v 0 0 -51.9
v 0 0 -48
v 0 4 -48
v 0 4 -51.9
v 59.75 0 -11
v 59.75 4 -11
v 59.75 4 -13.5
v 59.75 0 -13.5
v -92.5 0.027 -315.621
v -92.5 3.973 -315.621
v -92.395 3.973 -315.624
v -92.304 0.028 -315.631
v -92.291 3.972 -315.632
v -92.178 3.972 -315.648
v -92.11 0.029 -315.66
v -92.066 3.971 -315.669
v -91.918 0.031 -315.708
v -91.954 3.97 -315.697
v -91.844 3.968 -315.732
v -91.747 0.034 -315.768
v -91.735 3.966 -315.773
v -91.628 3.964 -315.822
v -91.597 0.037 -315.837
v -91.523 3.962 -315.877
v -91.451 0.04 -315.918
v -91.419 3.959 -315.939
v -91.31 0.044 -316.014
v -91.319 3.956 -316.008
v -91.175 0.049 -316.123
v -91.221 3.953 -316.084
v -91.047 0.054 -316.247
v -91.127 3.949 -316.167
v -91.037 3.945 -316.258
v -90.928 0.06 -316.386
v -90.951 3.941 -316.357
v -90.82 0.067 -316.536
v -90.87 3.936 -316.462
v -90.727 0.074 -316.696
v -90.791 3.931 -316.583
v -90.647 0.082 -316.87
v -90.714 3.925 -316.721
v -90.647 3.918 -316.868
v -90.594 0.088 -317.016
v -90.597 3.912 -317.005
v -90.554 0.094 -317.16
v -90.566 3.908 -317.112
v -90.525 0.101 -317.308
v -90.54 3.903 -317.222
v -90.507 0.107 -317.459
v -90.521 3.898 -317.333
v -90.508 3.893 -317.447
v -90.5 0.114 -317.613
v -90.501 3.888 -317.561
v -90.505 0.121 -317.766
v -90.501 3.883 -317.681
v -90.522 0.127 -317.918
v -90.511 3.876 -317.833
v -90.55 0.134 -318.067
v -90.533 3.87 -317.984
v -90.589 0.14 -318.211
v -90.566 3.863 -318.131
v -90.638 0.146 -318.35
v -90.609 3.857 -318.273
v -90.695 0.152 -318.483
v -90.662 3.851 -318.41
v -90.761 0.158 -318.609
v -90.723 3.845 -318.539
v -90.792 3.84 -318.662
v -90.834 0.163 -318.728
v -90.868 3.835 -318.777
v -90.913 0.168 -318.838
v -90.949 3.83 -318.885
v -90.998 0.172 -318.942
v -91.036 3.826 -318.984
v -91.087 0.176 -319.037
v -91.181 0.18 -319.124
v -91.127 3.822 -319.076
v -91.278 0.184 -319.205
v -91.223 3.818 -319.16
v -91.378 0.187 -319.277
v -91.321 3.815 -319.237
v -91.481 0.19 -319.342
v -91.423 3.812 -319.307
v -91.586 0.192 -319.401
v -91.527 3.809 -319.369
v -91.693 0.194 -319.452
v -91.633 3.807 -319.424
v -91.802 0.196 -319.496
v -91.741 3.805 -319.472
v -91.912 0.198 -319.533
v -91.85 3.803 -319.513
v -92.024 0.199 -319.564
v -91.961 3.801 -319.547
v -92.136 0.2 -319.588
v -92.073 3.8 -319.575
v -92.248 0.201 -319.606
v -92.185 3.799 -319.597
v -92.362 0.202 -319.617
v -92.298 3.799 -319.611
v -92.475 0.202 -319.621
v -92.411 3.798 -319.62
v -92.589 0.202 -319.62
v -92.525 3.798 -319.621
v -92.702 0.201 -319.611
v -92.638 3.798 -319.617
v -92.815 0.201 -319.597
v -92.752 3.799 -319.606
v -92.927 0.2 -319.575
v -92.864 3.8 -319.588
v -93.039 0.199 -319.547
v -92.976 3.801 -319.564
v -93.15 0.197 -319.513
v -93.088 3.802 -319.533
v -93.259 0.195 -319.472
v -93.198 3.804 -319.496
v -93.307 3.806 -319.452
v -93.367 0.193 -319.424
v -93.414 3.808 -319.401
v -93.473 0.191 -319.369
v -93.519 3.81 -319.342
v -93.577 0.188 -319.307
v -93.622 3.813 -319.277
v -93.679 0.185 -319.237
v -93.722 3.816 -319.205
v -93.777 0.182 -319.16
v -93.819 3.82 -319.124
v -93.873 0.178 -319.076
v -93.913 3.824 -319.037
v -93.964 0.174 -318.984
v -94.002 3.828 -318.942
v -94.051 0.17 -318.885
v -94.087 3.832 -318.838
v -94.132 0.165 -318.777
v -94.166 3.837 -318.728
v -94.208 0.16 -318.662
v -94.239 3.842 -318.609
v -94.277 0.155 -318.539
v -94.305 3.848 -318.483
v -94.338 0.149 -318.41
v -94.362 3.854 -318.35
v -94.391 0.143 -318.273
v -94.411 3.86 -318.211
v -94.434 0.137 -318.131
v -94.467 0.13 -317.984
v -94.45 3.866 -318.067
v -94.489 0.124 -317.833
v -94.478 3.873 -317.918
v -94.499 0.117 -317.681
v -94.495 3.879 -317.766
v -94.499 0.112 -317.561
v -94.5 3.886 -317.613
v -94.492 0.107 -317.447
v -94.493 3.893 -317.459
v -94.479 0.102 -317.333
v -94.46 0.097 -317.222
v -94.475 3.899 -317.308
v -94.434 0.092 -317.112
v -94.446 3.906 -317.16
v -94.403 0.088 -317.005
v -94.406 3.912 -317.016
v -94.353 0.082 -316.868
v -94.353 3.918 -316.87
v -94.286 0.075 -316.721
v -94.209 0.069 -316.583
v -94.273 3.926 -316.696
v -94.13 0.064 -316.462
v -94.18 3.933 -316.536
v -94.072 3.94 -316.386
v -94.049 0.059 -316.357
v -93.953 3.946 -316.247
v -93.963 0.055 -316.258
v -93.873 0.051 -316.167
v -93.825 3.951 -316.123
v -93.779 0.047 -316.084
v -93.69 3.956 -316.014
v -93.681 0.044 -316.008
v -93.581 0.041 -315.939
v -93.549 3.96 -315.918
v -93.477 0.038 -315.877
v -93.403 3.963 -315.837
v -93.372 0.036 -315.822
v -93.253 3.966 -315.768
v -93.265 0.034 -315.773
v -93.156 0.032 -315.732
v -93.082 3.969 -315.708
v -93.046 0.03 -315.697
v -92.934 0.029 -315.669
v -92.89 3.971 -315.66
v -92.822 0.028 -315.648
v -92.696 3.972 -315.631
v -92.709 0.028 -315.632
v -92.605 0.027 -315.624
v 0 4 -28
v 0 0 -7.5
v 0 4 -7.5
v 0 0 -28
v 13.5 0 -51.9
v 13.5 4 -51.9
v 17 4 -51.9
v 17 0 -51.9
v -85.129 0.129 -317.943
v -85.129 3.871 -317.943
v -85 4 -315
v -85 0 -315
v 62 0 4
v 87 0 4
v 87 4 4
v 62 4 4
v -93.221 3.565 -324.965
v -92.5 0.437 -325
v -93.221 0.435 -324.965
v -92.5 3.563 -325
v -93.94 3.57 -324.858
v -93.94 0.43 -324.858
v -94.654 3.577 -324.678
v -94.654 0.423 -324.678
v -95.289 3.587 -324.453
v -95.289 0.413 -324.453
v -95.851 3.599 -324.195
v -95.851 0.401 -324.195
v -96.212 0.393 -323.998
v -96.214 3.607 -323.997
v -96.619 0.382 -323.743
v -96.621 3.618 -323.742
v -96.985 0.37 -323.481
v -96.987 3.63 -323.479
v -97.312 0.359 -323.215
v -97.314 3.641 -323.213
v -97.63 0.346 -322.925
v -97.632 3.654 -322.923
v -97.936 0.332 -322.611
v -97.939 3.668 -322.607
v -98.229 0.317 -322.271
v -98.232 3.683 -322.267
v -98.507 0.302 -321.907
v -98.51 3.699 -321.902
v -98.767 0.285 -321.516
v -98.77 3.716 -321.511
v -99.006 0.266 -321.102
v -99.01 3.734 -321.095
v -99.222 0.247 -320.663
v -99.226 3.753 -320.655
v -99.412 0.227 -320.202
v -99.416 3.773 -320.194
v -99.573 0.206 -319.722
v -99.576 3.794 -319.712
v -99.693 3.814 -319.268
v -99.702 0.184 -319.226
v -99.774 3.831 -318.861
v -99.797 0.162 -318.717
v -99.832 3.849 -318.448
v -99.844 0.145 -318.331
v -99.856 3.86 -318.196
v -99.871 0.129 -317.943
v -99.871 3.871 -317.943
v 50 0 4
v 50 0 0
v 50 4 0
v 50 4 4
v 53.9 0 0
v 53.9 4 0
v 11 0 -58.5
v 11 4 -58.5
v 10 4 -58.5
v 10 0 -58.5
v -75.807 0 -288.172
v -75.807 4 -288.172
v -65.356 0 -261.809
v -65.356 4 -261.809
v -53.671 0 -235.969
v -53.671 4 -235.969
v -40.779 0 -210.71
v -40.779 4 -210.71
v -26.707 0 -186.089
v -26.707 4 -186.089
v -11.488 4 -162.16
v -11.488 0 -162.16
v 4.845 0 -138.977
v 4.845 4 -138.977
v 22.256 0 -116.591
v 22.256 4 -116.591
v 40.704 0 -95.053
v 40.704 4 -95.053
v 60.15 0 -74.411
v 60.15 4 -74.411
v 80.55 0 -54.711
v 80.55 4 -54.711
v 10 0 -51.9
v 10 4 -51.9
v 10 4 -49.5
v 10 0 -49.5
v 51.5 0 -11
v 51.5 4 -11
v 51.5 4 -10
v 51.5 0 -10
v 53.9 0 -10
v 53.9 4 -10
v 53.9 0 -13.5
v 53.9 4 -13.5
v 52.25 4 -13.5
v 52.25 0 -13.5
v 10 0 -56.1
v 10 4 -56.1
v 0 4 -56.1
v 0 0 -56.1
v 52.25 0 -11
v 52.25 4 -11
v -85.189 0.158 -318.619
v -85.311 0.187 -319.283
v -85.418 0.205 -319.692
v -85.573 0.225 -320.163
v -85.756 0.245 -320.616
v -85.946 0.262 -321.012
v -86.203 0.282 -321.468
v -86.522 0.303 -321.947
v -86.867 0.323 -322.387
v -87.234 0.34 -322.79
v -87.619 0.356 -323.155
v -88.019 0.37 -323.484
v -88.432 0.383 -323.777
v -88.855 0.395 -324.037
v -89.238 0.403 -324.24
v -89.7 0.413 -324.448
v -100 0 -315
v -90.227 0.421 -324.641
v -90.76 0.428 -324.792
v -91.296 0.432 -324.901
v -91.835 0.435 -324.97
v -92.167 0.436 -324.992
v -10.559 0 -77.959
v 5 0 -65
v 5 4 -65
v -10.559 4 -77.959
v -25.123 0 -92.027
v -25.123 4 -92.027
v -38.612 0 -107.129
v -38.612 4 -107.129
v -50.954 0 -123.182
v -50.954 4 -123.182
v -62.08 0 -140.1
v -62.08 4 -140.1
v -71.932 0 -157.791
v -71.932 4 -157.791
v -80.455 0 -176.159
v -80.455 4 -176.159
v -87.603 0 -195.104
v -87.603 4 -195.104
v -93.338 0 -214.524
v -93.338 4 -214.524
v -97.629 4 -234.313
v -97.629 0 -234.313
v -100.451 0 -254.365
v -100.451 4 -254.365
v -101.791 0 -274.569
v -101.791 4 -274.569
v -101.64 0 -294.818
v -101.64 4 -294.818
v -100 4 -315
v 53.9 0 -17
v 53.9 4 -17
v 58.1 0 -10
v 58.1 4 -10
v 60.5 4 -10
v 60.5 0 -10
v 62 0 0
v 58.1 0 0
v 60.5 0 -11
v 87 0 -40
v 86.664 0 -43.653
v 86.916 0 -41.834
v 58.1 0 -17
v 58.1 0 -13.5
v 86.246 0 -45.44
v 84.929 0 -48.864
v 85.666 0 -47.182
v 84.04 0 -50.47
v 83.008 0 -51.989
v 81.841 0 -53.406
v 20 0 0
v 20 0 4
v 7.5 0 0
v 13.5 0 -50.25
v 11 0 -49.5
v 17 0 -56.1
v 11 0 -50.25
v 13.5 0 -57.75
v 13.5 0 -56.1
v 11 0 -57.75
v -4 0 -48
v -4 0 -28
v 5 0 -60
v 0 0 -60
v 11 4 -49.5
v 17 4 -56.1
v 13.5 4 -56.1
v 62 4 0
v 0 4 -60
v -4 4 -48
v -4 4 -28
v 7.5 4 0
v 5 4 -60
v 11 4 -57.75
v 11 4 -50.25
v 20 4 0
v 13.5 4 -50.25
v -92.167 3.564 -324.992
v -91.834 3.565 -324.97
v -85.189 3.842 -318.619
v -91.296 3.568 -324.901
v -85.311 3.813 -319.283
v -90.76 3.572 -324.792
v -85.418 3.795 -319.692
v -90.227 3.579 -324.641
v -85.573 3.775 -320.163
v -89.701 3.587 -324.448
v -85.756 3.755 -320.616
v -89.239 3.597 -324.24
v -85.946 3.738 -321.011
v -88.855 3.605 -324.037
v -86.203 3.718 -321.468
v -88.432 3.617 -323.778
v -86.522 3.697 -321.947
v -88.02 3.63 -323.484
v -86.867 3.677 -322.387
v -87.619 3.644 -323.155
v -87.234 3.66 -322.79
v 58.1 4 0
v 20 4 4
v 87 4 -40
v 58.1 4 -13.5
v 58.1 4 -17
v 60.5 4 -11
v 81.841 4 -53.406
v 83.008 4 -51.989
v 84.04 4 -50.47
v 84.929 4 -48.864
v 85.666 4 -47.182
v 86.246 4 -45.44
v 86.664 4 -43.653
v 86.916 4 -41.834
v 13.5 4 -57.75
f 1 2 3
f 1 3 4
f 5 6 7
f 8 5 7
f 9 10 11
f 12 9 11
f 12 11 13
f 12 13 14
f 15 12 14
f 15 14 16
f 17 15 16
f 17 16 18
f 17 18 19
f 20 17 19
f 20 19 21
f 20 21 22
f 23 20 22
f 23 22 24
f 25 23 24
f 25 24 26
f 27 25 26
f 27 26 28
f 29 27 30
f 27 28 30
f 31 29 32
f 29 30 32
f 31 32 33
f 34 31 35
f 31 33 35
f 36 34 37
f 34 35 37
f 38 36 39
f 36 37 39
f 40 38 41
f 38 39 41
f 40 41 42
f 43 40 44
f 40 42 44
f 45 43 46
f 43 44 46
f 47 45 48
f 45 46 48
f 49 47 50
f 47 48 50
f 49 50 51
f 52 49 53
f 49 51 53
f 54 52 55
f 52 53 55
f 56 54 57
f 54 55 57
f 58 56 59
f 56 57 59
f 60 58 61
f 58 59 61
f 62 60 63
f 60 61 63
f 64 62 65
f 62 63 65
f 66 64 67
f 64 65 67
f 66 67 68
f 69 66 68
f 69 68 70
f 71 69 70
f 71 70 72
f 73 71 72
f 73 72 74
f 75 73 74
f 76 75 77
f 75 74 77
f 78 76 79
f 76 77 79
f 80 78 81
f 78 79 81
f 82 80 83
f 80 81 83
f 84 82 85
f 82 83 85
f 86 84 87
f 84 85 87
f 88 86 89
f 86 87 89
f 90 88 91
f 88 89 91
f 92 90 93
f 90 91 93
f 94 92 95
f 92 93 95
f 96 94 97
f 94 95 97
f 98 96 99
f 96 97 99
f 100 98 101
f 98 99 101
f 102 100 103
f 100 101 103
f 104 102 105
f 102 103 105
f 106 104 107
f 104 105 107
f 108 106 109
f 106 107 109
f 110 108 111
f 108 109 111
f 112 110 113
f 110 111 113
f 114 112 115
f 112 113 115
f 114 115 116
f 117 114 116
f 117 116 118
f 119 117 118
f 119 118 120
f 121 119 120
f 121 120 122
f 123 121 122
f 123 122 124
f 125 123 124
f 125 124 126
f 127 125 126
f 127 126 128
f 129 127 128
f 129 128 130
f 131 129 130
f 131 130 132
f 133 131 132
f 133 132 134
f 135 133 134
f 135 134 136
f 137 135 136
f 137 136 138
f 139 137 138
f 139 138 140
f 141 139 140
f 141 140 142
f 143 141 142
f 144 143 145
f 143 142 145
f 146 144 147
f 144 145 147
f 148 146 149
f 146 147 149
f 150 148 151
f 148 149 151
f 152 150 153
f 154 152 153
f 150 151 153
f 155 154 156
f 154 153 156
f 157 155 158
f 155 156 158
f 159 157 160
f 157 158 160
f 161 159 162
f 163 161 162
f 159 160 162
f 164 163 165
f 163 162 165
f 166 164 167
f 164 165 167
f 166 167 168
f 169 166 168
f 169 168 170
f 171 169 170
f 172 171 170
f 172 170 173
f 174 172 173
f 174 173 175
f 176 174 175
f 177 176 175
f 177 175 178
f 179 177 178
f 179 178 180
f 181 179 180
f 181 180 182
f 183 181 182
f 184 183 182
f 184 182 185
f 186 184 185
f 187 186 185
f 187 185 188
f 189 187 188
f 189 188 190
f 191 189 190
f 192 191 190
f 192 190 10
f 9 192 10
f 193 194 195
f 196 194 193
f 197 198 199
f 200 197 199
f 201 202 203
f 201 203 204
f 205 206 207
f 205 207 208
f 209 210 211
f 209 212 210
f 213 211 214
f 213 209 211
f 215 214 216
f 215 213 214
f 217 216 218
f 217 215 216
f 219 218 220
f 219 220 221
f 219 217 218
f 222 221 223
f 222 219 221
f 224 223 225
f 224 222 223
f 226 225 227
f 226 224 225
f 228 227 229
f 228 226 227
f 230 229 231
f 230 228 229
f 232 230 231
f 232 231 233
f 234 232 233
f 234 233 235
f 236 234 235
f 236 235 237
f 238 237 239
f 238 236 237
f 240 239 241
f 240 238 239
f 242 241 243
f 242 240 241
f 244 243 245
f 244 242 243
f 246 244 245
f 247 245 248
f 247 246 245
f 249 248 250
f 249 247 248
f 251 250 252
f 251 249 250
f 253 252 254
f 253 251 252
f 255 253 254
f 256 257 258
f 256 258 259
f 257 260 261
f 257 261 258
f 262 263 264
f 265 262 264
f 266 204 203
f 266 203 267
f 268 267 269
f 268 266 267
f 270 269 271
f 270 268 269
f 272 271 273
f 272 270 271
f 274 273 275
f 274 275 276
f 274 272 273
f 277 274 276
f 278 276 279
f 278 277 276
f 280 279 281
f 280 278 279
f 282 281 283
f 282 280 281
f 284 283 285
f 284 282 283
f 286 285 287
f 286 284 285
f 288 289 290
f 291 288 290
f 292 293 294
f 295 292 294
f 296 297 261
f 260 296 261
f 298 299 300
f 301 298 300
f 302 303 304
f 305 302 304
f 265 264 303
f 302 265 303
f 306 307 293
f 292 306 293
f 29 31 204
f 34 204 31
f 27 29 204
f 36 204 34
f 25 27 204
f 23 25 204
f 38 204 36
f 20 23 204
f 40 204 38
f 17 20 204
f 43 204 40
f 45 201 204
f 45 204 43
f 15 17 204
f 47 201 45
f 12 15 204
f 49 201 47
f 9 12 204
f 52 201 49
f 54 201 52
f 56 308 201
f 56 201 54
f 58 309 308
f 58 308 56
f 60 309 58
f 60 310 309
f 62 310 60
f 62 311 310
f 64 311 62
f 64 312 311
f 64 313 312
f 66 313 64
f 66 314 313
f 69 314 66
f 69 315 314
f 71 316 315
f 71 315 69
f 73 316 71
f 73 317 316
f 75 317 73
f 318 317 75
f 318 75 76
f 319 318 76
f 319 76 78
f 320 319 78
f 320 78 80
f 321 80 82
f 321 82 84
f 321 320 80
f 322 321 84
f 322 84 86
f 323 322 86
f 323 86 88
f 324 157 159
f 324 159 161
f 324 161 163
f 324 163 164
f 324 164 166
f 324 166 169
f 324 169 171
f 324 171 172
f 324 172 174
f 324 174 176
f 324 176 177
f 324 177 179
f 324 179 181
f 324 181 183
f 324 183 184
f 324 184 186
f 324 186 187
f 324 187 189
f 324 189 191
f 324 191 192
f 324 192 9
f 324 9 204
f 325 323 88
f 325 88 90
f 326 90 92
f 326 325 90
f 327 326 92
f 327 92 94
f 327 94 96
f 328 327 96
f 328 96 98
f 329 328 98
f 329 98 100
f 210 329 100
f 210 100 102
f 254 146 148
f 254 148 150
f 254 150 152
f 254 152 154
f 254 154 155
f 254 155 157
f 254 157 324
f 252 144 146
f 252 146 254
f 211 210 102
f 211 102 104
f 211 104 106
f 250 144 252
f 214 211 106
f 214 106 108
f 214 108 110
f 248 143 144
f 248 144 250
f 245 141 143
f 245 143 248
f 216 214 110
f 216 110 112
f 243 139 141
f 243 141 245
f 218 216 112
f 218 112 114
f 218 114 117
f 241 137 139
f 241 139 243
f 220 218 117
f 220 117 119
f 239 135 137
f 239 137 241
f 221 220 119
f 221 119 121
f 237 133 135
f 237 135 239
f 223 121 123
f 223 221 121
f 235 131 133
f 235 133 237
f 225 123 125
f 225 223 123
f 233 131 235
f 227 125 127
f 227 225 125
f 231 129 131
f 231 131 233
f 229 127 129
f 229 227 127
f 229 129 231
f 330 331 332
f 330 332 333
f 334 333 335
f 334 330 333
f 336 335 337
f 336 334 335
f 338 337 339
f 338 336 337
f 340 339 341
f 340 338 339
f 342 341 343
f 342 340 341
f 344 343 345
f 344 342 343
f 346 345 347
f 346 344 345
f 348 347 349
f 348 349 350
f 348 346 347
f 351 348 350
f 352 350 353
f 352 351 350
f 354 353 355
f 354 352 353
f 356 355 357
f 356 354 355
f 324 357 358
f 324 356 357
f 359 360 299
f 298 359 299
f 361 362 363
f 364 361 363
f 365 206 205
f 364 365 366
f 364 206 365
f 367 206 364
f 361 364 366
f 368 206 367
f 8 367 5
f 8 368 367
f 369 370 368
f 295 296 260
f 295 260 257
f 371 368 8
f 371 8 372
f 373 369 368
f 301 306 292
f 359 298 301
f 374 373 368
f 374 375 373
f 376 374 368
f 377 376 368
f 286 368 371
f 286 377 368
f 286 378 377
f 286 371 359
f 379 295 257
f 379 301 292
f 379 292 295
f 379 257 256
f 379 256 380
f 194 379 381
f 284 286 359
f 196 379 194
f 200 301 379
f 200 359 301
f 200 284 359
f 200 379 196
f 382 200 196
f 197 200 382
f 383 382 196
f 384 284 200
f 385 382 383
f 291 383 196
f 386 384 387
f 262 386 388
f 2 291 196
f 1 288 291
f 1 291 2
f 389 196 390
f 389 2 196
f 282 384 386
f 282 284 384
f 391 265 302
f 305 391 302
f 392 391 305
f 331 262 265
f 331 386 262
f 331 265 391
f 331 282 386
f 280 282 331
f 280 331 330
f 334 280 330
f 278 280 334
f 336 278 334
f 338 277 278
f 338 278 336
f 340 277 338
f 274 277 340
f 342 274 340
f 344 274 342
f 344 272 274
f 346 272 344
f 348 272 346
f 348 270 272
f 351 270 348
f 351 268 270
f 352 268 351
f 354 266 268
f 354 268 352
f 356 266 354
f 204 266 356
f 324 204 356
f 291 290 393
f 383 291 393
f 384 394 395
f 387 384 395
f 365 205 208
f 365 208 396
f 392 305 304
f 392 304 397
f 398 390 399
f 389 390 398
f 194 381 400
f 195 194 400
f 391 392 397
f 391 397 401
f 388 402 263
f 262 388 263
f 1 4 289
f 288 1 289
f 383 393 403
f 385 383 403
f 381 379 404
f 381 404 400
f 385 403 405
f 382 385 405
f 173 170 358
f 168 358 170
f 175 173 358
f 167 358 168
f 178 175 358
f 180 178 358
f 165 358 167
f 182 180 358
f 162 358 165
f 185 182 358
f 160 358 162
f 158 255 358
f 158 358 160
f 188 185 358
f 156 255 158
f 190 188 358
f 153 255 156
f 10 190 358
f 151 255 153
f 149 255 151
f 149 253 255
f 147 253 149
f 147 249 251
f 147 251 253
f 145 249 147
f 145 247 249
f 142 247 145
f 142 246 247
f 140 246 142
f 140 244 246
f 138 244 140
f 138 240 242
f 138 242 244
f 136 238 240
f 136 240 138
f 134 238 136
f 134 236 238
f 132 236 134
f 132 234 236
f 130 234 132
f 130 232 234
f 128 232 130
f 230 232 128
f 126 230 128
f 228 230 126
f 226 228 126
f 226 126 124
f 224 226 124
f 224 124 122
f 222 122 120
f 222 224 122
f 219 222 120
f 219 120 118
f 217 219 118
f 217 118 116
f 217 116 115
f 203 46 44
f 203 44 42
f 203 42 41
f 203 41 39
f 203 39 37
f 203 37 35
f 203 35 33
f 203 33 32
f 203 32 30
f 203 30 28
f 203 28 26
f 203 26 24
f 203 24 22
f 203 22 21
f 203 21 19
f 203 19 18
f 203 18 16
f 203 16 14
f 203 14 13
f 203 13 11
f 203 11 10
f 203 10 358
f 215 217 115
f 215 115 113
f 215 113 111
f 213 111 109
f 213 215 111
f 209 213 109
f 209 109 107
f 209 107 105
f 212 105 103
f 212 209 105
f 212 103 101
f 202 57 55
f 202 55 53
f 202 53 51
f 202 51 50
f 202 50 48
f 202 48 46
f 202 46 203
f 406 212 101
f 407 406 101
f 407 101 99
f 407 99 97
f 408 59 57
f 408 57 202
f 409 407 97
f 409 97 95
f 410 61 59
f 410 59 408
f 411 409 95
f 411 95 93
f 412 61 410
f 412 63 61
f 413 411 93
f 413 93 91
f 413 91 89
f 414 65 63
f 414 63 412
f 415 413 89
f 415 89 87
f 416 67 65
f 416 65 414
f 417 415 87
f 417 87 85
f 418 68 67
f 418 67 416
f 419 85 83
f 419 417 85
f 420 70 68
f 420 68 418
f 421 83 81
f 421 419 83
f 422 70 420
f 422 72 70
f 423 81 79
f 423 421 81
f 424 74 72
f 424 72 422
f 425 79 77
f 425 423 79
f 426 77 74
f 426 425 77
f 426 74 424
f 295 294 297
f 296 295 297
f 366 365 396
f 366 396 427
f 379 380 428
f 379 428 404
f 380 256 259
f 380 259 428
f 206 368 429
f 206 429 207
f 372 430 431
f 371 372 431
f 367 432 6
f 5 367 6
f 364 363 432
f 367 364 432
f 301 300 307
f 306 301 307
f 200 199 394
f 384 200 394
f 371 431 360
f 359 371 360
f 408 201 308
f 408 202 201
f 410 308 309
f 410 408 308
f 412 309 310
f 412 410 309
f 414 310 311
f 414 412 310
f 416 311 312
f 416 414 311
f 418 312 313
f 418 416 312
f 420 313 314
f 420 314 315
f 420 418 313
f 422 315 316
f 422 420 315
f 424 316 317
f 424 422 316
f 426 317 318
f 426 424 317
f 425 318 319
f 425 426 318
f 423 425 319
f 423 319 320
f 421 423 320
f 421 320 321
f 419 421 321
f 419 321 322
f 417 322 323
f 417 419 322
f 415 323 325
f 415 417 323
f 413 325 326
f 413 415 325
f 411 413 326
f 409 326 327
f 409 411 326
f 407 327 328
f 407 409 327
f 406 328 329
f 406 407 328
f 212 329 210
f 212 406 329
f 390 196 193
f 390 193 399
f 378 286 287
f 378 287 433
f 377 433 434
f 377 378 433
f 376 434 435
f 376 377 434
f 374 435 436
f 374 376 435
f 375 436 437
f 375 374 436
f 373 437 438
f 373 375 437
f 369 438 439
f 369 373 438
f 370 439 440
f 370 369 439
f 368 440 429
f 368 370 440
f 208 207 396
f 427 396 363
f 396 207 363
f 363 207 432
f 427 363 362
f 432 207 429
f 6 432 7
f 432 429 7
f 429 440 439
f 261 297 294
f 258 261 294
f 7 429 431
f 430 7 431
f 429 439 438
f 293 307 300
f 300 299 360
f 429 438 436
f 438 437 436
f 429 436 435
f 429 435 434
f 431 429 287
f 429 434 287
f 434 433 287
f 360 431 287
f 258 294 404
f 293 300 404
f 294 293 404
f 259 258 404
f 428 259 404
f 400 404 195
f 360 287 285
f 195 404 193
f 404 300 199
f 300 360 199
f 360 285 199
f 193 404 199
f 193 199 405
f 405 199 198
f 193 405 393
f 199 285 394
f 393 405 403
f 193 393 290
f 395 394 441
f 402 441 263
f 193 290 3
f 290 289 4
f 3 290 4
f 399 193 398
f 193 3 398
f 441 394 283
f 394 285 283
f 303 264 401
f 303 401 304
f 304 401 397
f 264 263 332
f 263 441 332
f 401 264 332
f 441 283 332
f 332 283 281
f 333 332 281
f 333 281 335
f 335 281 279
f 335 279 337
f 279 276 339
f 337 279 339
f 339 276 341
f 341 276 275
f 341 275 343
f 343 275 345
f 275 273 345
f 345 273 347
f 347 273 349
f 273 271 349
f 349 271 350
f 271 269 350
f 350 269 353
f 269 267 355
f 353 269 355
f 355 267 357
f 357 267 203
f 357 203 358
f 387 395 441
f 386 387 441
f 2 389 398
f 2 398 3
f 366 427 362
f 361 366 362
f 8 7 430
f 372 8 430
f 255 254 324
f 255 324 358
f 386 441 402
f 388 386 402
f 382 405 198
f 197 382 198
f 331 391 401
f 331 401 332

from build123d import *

# Parameters (mm, degrees)
BOSS_EXTRUDE1_DEPTH = 4
SKETCH3_W           = 15
SKETCH3_H           = 4
BOSS_EXTRUDE2_DEPTH = 10
BOSS_EXTRUDE2_TAPER = 2.5
FILLET1_R           = 7.378514
SKETCH4_R           = 2
CUT_EXTRUDE1_DEPTH  = 341.626738097
CUT_EXTRUDE2_DEPTH  = 10
CHAMFER1_SIZE       = 7.5


with BuildPart() as part:
    # Sketch1 → Boss-Extrude1 (new body)
    with BuildSketch(Plane(origin=(0, 0, 0), x_dir=(1, 0, 0), z_dir=(0, 1, 0))):
        with BuildLine():
            Line((87, 0), (87, -4))
            Line((87, -4), (62, -4))
            Line((62, -4), (62, 0))
            Line((62, 0), (50, 0))
            Line((50, 0), (50, -4))
            Line((50, -4), (20, -4))
            Line((20, -4), (20, 0))
            Line((20, 0), (0, 0))
            Line((0, 0), (0, 28))
            Line((0, 28), (-4, 28))
            Line((-4, 28), (-4, 48))
            Line((-4, 48), (0, 48))
            Line((0, 48), (0, 60))
            Line((0, 60), (5, 60))
            Line((5, 60), (5, 65))
            ThreePointArc((5, 65), (-80.454718631, 176.159018175), (-100, 315))
            Line((-100, 315), (-85, 315))
            ThreePointArc((-85, 315), (-19.238758626, 174.034445441), (80.549564864, 54.710856263))
            ThreePointArc((80.549564864, 54.710856263), (85.316540302, 48.031460101), (87, 40))
            Line((87, 40), (87, 0))
        make_face()
    extrude(amount=BOSS_EXTRUDE1_DEPTH)

    # Sketch3 → Boss-Extrude2 (add)
    with BuildSketch(Plane(origin=(0, 0, -315), x_dir=(-1, 0, 0), z_dir=(0, 0, -1))):
        with Locations((92.5, 2)):
            Rectangle(SKETCH3_W, SKETCH3_H)
    extrude(amount=BOSS_EXTRUDE2_DEPTH, taper=BOSS_EXTRUDE2_TAPER)

    # Fillet1
    fillet1_edges = [part.edges().sort_by_distance(p)[0] for p in [
        (-85.436609429, 2, -325),
        (-99.563390571, 2, -325),
    ]]
    fillet(fillet1_edges, radius=FILLET1_R - 0.0001)  # a hair under: the kernel refuses the full size

    # Sketch4 → Cut-Extrude1 (cut, through all)
    with BuildSketch(Plane(origin=(0, 4, 0), x_dir=(1, 0, 0), z_dir=(0, 1, 0))):
        with Locations(Location((-92.5, 317.621485949, 0), (0, 0, 270))):
            Circle(SKETCH4_R)
    extrude(amount=-CUT_EXTRUDE1_DEPTH, mode=Mode.SUBTRACT)

    # Sketch5 → Cut-Extrude2 (cut)
    with BuildSketch(Plane(origin=(0, 4, 0), x_dir=(1, 0, 0), z_dir=(0, 1, 0))):
        Polygon((53.9, 10), (53.9, 0), (58.1, 0), (58.1, 10), (60.5, 10), (60.5, 11), (59.75, 11), (59.75, 13.5), (58.1, 13.5), (58.1, 17), (53.9, 17), (53.9, 13.5), (52.25, 13.5), (52.25, 11), (51.5, 11), (51.5, 10), align=None)
        Polygon((10, 56.1), (0, 56.1), (0, 51.9), (10, 51.9), (10, 49.5), (11, 49.5), (11, 50.25), (13.5, 50.25), (13.5, 51.9), (17, 51.9), (17, 56.1), (13.5, 56.1), (13.5, 57.75), (11, 57.75), (11, 58.5), (10, 58.5), align=None)
    extrude(amount=-CUT_EXTRUDE2_DEPTH, mode=Mode.SUBTRACT)

    # Chamfer1
    chamfer1_edges = [part.edges().sort_by_distance(p)[0] for p in [
        (0, 2, 0),
    ]]
    chamfer(chamfer1_edges, length=CHAMFER1_SIZE)


solid = part.part
